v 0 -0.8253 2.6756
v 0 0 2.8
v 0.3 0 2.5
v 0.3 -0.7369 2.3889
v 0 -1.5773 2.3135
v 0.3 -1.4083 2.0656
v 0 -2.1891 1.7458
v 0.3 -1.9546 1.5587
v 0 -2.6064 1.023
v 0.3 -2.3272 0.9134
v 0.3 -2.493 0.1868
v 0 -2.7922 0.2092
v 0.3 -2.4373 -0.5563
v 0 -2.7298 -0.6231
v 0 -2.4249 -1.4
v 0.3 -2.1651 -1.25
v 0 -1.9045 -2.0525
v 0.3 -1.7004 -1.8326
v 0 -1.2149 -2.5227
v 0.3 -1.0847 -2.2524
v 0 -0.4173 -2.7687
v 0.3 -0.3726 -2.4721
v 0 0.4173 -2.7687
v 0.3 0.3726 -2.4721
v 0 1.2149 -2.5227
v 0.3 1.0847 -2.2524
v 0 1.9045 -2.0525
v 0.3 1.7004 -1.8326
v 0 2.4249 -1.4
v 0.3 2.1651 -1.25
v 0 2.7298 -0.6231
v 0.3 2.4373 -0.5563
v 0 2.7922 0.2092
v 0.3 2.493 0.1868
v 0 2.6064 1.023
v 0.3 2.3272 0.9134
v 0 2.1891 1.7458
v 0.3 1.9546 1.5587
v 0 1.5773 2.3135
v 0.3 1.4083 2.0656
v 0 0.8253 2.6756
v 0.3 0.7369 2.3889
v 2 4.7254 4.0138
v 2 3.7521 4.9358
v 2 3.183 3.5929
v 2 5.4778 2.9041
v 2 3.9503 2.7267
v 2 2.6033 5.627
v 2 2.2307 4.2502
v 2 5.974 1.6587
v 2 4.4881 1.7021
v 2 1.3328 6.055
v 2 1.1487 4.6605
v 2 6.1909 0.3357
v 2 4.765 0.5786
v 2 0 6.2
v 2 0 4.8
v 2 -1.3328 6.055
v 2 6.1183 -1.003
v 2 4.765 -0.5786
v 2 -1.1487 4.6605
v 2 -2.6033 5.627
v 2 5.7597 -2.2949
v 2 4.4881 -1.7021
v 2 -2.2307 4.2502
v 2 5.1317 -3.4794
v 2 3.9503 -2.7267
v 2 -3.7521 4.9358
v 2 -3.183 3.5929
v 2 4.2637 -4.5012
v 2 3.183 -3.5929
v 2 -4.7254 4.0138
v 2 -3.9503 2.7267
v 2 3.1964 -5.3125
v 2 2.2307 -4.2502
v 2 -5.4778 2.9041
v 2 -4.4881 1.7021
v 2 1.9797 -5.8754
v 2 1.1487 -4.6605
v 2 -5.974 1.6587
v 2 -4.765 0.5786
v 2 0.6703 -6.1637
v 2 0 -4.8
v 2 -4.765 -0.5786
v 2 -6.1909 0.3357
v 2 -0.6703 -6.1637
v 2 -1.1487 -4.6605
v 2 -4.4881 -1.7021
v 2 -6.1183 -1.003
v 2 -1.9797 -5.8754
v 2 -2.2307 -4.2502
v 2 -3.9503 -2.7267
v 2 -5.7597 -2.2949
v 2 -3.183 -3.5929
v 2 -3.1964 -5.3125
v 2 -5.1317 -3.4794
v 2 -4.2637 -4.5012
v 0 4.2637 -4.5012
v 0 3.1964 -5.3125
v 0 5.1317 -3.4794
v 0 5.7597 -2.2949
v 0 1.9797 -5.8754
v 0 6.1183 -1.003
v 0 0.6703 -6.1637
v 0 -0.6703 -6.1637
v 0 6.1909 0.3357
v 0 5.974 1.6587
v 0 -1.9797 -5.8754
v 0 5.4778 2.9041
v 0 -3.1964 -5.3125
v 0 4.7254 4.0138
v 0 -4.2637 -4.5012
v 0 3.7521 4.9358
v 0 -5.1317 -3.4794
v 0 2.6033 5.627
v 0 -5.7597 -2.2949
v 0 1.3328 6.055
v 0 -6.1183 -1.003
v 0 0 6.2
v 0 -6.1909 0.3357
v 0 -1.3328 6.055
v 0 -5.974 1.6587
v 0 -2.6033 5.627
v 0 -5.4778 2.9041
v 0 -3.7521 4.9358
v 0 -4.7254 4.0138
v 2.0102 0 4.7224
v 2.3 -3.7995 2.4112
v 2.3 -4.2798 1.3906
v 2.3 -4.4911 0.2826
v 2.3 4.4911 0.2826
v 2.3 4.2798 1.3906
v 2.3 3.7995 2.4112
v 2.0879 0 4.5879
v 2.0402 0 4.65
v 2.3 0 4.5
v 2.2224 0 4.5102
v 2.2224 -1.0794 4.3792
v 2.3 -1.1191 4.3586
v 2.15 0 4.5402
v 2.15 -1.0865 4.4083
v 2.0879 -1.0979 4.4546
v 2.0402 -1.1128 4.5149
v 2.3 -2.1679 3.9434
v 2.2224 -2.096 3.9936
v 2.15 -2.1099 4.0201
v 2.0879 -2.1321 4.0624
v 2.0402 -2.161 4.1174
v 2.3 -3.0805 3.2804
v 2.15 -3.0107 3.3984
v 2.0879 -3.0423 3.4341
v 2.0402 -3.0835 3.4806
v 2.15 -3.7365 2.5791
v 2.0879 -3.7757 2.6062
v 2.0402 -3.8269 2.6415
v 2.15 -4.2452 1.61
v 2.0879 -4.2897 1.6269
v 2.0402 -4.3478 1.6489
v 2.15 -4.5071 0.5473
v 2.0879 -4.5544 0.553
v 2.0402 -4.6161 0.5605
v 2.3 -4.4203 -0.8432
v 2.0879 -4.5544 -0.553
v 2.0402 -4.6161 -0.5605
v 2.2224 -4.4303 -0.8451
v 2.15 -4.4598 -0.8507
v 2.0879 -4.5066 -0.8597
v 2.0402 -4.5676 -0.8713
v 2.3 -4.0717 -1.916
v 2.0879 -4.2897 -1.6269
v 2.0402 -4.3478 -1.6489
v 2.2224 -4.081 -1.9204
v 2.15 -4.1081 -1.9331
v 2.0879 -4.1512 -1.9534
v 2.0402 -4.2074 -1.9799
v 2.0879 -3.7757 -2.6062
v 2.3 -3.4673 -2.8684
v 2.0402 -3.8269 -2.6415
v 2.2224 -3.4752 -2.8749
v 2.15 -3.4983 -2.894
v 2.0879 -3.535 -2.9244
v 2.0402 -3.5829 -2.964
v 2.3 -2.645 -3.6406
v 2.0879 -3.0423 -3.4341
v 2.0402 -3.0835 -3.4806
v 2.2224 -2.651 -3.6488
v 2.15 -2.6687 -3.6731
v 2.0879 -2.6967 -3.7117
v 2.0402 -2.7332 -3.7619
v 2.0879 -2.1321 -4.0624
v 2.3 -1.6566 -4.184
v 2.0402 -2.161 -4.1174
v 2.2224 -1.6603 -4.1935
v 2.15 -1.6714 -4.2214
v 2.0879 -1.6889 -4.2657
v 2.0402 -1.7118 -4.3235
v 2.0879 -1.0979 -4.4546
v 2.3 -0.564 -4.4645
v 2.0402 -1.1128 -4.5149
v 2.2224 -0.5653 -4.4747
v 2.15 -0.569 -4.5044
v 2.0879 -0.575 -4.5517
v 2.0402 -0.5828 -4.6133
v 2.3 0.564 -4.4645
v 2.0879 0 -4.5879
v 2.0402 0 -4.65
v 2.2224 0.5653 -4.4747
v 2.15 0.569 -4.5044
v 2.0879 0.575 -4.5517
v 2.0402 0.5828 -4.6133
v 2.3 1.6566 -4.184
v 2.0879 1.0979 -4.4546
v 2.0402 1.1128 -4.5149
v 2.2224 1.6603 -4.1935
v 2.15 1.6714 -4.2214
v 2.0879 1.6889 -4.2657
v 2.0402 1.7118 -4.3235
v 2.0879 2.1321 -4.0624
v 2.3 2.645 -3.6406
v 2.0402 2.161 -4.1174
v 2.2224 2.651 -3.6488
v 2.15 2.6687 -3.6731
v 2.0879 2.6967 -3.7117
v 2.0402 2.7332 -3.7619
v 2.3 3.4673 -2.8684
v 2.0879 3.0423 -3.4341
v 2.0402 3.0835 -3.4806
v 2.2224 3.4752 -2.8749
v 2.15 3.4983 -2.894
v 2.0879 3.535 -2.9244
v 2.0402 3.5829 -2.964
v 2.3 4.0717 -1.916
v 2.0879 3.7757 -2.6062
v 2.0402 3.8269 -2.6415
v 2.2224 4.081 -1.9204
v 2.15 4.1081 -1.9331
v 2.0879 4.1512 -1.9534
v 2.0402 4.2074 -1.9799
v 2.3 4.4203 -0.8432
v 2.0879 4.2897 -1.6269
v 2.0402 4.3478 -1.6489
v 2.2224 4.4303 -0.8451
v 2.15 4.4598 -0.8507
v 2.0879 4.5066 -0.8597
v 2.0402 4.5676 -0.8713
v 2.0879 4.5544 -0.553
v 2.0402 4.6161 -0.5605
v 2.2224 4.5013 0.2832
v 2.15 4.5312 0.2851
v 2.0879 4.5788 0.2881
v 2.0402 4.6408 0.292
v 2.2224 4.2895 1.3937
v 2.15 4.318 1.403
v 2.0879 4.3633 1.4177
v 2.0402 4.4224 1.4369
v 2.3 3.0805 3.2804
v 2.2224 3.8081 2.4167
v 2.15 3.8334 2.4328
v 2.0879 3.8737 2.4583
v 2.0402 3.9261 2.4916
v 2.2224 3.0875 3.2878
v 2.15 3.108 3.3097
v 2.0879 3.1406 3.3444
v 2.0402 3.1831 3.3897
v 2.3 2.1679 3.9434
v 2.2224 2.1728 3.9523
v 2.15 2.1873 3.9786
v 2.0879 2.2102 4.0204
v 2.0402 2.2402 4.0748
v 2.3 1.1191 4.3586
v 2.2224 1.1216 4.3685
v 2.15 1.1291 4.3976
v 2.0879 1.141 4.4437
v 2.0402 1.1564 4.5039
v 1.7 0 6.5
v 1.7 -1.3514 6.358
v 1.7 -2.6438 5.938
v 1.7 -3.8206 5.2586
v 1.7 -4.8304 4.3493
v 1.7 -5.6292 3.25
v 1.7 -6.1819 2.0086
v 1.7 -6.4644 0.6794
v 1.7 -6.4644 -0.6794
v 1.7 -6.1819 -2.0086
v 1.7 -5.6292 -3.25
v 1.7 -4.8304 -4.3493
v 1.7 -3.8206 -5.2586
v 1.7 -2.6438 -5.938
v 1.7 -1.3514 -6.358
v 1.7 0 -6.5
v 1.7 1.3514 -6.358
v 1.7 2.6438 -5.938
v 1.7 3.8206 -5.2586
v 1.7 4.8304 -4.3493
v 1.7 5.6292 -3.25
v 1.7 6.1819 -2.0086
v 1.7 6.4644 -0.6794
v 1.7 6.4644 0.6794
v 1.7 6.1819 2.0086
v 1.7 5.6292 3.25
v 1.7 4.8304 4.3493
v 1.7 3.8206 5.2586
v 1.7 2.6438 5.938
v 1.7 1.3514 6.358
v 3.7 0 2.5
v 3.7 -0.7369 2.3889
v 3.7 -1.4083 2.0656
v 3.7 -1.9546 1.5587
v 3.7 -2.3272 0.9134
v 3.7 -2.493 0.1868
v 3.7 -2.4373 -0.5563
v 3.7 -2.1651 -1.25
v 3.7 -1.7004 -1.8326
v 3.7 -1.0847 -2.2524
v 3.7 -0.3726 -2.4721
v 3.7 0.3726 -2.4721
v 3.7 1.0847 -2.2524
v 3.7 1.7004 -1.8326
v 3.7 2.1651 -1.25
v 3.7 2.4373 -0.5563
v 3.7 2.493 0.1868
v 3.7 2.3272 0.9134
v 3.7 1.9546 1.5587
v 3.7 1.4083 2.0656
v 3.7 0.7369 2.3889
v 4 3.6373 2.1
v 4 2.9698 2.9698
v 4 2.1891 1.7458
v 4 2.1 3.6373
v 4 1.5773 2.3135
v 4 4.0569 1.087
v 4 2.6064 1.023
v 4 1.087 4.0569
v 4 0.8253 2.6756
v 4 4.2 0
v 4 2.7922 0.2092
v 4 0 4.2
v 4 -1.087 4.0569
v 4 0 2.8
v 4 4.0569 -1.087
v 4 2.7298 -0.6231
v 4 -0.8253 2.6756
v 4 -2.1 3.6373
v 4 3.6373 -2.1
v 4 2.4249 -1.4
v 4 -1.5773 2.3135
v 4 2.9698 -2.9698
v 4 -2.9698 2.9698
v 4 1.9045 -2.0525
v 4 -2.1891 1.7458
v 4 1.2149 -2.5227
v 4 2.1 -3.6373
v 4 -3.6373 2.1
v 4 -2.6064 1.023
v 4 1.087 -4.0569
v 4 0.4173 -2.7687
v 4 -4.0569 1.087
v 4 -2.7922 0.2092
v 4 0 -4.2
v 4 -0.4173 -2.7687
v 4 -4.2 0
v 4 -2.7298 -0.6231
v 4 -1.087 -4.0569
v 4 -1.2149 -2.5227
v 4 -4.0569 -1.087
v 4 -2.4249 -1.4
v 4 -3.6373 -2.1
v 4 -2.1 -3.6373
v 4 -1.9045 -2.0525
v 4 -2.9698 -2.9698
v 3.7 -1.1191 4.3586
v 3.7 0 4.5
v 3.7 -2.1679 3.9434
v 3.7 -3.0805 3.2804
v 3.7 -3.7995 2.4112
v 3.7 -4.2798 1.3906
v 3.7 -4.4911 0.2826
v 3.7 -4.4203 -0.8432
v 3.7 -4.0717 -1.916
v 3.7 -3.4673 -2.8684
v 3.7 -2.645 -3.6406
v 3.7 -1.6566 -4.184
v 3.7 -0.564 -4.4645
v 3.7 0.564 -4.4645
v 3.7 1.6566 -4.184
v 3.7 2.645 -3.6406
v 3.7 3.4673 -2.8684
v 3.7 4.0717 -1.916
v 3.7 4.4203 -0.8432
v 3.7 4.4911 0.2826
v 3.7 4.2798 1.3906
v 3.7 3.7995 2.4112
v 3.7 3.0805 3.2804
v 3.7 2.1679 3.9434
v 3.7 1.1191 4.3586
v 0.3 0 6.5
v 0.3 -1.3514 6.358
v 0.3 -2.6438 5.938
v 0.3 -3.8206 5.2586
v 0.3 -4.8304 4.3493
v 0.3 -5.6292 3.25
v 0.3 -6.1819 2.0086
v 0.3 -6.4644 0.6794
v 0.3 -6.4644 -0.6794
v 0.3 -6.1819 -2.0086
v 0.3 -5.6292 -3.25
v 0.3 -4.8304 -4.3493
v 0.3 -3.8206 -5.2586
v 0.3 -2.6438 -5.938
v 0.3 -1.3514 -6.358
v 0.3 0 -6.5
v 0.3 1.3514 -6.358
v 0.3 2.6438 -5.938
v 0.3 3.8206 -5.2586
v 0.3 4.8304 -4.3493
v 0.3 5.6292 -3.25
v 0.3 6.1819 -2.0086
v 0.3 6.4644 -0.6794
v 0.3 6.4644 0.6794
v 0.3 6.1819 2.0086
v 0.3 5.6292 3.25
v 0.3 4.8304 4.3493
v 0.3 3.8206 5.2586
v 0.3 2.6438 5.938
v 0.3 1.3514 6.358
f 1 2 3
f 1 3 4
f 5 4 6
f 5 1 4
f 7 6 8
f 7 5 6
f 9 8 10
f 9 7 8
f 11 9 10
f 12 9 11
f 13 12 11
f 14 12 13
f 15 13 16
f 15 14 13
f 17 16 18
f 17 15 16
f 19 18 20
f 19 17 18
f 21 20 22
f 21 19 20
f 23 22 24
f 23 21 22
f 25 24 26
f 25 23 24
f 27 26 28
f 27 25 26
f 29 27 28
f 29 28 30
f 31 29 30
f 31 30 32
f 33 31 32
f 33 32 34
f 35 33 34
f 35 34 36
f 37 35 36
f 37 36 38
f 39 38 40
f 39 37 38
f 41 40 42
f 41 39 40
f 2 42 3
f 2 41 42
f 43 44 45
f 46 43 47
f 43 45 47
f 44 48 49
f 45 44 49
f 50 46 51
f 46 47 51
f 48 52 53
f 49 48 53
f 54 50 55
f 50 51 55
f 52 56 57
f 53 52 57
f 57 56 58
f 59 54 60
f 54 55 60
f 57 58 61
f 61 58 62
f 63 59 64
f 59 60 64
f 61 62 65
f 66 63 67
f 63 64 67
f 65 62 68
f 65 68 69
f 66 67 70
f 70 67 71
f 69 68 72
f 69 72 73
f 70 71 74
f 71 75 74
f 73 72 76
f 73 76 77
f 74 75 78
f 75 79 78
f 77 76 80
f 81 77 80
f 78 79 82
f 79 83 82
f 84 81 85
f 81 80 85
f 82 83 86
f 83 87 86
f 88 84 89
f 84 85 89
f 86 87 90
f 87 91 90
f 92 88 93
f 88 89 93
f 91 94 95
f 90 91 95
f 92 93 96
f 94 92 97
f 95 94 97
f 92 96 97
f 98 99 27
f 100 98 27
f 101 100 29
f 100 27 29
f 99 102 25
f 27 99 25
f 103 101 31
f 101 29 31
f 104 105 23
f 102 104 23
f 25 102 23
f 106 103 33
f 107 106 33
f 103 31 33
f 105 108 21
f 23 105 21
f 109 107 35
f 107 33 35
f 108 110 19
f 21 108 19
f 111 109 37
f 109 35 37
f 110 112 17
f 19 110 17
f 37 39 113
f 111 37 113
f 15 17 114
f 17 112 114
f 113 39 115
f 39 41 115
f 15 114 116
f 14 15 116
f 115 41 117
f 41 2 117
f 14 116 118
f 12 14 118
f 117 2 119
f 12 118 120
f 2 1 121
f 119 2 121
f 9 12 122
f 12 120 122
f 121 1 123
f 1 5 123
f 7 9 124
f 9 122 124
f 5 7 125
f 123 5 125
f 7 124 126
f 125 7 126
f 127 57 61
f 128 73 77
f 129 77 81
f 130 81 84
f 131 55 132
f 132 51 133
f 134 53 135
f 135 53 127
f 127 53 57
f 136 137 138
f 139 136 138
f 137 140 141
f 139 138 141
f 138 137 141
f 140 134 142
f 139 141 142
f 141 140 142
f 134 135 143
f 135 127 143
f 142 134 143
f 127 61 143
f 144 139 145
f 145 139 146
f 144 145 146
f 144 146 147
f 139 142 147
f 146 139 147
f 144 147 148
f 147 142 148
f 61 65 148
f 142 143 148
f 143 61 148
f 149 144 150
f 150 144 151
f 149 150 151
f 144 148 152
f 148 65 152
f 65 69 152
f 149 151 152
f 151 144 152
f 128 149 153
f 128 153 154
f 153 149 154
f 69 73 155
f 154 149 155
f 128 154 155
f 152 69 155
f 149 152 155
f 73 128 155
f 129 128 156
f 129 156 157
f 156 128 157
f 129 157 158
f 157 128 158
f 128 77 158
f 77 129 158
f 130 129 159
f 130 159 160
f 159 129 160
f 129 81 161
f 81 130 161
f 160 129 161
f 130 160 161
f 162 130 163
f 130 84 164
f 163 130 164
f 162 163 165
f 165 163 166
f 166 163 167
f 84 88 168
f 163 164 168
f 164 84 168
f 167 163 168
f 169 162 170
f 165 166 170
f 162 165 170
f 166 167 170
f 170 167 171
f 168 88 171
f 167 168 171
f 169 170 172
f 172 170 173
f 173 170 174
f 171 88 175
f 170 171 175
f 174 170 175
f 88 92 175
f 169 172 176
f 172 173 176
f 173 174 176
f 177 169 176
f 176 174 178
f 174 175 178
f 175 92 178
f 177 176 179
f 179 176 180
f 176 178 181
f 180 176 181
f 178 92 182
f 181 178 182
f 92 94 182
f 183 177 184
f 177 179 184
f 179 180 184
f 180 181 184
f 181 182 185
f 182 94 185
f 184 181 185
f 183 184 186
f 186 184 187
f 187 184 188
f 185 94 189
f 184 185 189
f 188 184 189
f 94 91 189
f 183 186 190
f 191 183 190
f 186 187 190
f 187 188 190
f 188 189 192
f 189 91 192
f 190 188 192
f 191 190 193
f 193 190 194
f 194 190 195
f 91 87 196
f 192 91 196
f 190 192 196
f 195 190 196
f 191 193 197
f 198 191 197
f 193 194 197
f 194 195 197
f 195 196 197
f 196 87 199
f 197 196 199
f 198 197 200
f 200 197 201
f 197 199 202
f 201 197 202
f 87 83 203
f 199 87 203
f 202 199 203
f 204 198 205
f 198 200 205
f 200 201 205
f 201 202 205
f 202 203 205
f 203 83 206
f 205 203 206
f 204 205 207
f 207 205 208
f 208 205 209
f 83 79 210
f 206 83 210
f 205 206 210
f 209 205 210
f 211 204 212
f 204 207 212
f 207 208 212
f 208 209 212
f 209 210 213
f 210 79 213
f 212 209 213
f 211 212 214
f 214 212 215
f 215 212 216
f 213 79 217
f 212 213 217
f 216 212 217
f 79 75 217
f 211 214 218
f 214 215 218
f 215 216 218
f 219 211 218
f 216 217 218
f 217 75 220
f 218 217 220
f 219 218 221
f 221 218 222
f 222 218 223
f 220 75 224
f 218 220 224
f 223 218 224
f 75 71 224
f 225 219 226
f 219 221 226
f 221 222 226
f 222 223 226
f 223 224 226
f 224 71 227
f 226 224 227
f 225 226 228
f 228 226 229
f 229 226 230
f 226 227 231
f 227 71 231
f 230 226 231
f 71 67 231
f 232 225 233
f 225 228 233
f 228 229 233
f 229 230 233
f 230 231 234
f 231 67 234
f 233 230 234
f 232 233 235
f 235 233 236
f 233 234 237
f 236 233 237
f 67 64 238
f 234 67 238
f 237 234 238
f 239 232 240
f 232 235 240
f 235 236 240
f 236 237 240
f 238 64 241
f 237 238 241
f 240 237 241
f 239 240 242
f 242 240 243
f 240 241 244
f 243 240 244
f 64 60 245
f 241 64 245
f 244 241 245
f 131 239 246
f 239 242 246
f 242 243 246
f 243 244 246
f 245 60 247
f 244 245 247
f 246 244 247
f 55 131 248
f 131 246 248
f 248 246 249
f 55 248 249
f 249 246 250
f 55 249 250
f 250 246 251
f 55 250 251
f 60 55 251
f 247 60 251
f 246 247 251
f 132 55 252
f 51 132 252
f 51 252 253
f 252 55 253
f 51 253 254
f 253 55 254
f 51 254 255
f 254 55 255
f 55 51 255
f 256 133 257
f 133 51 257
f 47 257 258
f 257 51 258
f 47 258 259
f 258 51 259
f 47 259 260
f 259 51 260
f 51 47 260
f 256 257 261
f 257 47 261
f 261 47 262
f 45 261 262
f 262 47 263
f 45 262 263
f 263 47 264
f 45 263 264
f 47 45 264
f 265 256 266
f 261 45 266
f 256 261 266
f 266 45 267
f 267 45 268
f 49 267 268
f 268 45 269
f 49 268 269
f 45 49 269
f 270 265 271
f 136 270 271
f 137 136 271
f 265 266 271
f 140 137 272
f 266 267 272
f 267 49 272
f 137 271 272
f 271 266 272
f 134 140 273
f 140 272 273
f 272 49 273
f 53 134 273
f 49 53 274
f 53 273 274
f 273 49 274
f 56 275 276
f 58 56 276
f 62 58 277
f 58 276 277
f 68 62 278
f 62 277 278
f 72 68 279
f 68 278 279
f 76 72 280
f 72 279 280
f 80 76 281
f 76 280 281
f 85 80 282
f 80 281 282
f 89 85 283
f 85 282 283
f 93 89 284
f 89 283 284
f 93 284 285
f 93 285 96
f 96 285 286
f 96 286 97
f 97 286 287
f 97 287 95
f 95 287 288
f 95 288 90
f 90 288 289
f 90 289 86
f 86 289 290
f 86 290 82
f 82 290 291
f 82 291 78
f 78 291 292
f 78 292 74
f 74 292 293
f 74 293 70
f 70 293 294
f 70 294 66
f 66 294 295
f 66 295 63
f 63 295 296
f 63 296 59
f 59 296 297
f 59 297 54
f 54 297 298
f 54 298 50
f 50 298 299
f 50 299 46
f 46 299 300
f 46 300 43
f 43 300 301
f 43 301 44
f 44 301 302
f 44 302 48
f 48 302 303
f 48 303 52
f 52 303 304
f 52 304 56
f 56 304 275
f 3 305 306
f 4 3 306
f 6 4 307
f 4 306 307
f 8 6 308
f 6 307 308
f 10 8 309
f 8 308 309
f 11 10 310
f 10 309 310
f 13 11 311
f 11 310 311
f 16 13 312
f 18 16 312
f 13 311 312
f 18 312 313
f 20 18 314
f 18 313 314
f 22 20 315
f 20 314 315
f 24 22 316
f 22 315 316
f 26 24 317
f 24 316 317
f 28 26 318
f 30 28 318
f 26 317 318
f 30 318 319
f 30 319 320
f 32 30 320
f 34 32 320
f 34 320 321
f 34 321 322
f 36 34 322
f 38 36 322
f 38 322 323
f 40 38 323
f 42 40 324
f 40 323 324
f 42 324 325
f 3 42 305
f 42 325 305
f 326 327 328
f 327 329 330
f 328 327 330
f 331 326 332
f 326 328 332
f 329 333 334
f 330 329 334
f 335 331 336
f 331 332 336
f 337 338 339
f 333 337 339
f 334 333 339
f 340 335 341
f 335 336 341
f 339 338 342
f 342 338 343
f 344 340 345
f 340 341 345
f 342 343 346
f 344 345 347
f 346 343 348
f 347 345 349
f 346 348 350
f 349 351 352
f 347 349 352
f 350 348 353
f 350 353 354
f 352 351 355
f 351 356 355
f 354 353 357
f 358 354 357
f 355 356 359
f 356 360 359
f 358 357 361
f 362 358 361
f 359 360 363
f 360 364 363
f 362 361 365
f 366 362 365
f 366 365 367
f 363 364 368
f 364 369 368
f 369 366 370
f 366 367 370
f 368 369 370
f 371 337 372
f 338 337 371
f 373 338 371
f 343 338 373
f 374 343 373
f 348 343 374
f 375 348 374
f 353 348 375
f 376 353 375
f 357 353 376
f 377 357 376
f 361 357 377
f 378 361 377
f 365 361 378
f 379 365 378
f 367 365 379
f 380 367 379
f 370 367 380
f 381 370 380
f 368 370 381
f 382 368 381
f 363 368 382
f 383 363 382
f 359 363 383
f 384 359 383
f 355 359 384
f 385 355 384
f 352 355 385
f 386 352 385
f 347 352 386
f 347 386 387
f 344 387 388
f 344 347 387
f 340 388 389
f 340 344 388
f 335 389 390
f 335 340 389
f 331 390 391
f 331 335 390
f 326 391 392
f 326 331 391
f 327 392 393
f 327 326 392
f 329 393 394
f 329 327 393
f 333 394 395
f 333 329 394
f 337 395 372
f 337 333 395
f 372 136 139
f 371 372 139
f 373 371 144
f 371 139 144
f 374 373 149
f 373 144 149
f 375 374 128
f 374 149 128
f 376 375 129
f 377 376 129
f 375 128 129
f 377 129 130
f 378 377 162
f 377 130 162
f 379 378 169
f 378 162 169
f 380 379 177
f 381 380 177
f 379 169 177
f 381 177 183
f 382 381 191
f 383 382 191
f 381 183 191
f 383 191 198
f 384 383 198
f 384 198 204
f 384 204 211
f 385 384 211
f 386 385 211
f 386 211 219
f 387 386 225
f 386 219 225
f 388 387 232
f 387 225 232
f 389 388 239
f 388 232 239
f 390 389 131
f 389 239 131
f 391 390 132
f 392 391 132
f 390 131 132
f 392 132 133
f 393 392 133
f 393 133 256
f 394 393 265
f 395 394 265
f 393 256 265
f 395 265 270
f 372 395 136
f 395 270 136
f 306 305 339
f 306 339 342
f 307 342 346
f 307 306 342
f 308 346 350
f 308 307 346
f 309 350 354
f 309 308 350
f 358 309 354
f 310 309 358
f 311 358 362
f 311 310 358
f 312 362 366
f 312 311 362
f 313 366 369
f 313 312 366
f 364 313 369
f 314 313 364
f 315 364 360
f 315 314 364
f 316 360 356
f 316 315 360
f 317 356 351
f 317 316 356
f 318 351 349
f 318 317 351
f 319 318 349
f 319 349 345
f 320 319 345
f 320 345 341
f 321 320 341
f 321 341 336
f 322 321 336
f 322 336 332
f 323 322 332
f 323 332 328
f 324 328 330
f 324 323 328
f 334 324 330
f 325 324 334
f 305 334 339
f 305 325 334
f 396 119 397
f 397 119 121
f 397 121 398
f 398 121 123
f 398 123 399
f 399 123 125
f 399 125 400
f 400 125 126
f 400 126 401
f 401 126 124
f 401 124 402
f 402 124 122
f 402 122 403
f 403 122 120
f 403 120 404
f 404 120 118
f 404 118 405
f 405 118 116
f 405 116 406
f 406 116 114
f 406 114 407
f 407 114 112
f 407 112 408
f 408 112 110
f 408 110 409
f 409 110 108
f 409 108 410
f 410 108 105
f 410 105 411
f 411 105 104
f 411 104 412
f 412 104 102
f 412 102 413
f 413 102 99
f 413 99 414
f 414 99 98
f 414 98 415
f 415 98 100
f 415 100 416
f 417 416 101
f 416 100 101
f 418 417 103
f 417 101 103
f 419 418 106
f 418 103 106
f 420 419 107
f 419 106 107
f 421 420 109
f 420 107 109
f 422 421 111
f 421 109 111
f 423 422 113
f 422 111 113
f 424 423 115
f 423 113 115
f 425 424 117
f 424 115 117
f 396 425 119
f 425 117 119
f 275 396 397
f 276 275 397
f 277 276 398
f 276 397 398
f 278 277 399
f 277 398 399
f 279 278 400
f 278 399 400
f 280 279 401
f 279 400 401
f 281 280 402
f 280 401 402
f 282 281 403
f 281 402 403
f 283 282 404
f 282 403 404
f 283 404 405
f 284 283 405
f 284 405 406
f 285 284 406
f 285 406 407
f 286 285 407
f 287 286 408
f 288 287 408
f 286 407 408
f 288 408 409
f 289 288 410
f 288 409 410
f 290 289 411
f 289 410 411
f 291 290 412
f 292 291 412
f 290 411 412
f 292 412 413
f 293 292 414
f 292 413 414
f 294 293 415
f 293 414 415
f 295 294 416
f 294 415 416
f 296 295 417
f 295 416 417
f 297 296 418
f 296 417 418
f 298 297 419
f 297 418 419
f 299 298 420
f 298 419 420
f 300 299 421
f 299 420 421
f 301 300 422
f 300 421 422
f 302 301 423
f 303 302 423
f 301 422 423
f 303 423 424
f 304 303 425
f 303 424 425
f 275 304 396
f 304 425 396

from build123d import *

# Parameters (mm, degrees)
ZAOBLIT1_R   = 0.3
ZKOSIT1_SIZE = 0.3


with BuildPart() as part:
    # Skica1 → Otočit kolem osy1 (revolve)
    with BuildSketch(Plane.XY, mode=Mode.PRIVATE) as oto_it_kolem_osy1_sk:
        Polygon((0, 2.5), (4, 2.5), (4, 4.5), (2, 4.5), (2, 6.5), (0, 6.5), align=None)
    revolve(oto_it_kolem_osy1_sk.sketch.rotate(Axis((0, 0, 0), (1, 0, 0)), 90), axis=Axis((0, 0, 0), (1, 0, 0)))

    # Zaoblit1
    zaoblit1_edges = [part.edges().sort_by_distance(p)[0] for p in [
        (2, 0, -4.5),
    ]]
    fillet(zaoblit1_edges, radius=ZAOBLIT1_R)

    # Zkosit1
    zkosit1_edges = [part.edges().sort_by_distance(p)[0] for p in [
        (0, 0, -6.5),
        (2, 0, -6.5),
        (4, 0, -4.5),
        (4, 0, -2.5),
        (0, 0, -2.5),
    ]]
    chamfer(zkosit1_edges, length=ZKOSIT1_SIZE)


solid = part.part
